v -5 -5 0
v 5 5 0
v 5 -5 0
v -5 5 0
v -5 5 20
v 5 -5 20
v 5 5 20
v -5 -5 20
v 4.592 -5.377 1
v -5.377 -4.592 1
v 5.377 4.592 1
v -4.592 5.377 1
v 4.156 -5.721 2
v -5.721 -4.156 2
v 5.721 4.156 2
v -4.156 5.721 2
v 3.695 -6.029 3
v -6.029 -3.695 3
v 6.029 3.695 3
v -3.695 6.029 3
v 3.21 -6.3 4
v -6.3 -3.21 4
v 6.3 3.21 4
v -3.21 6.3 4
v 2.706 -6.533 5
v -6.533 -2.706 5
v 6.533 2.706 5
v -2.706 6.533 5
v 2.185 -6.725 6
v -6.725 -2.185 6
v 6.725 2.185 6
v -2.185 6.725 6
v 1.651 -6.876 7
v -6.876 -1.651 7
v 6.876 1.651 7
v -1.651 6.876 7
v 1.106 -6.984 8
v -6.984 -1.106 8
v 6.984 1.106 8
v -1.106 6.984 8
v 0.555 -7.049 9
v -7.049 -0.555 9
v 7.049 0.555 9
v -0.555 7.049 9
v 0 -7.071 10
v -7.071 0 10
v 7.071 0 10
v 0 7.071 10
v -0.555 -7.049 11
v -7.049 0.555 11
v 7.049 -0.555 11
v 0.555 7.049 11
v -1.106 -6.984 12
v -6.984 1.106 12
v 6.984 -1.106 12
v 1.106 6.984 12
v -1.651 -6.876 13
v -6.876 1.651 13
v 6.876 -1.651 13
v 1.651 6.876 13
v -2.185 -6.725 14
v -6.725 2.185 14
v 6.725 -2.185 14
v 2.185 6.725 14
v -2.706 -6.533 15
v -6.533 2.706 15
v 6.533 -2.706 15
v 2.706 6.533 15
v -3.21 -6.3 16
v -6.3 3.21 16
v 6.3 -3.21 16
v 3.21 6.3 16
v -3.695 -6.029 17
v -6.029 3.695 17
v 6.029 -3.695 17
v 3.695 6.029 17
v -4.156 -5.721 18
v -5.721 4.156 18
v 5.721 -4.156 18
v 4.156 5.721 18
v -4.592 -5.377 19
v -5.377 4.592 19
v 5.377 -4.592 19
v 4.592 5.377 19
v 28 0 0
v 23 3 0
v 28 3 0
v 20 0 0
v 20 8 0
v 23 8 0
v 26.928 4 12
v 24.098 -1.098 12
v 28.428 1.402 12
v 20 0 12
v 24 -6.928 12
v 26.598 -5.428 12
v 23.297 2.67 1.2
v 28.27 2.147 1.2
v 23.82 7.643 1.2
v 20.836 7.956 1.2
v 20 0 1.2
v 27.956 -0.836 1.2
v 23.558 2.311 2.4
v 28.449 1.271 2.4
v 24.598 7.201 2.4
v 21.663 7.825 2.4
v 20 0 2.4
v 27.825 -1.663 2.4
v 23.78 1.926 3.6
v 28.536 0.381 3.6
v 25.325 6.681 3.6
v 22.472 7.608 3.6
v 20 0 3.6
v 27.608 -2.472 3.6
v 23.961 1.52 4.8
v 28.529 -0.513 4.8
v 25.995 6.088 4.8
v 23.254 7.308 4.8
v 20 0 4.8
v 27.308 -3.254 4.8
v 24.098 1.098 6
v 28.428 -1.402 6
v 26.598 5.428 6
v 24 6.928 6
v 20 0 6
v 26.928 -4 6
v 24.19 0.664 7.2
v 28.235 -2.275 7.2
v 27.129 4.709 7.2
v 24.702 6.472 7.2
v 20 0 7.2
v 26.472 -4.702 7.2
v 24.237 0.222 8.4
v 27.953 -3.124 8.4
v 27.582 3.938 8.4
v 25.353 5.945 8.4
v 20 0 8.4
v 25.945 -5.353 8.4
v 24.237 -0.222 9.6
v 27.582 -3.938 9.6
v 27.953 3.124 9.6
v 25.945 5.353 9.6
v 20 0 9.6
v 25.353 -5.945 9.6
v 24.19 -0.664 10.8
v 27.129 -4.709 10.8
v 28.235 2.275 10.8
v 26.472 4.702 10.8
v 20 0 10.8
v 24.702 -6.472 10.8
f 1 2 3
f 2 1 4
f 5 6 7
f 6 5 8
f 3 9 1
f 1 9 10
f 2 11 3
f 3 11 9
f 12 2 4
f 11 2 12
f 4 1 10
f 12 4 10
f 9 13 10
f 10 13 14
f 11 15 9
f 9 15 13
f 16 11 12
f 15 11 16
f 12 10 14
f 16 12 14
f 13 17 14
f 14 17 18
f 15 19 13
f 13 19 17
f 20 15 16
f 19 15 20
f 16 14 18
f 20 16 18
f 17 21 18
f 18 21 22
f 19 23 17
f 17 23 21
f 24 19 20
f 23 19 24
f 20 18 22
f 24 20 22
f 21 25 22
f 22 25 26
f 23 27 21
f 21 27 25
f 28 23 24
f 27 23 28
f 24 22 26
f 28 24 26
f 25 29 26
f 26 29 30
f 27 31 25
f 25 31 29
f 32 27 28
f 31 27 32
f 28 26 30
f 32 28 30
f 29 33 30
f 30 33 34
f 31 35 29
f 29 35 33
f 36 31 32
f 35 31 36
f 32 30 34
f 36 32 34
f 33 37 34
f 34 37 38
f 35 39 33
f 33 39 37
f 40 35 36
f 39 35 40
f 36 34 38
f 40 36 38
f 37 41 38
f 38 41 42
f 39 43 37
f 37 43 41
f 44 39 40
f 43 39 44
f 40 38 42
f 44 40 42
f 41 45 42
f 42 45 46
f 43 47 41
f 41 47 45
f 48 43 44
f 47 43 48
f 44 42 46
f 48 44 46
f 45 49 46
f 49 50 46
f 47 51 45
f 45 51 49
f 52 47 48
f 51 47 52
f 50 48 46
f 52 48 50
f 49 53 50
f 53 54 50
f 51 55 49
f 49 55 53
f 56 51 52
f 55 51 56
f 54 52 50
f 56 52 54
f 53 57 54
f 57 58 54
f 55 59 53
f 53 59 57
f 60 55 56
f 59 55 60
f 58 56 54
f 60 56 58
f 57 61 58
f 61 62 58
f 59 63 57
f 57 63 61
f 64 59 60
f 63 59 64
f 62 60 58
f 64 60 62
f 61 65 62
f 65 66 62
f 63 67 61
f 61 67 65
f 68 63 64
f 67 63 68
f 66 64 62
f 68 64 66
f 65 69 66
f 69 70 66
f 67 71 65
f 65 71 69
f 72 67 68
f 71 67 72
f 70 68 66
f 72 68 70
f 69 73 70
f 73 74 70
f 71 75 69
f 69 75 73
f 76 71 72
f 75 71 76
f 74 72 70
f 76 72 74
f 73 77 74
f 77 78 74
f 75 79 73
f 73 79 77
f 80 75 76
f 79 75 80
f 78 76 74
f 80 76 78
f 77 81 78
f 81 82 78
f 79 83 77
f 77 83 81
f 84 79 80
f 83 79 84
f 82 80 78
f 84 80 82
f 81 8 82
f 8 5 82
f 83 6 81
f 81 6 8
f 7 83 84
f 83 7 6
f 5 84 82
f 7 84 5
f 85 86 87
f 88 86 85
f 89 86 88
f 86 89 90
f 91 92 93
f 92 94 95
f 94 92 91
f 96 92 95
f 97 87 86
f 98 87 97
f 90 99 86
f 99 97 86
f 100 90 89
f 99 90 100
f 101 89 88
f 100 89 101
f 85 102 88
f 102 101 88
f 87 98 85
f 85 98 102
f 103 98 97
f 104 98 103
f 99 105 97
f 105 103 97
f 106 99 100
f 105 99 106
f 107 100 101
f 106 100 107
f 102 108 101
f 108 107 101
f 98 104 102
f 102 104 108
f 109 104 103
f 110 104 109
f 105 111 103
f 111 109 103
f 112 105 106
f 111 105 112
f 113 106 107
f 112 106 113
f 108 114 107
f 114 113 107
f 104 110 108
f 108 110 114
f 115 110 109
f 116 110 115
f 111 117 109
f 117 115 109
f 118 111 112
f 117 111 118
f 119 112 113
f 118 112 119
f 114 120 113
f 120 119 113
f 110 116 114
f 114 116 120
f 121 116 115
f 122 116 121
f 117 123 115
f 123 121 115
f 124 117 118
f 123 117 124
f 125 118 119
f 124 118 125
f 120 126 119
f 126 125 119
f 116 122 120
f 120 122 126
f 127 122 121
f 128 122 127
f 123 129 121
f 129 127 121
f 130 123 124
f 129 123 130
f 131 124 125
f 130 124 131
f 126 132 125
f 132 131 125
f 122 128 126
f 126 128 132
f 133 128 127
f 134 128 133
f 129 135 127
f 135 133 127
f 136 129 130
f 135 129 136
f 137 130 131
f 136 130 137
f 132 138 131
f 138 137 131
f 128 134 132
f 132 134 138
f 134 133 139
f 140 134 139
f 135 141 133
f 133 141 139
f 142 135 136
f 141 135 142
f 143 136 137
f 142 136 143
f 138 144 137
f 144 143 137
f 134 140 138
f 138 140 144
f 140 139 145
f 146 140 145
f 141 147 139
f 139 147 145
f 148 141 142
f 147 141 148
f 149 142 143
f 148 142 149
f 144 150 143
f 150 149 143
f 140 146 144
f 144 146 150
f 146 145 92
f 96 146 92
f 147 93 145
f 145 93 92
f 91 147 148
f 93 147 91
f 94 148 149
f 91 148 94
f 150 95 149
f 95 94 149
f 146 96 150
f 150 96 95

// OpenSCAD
// linear_extrude(twist=) is built as OpenSCAD builds it: a polyhedron through the slice rings, two
// triangles per side quad — a twisted square and a twisted non-convex L. (A cap with a hole and a
// twist + scale are pinned in cad-engine's extrude tests: this openscad-wasm's CGAL refuses both.)
linear_extrude(height = 20, twist = 90, slices = 20) square(10, center = true);
translate([20, 0, 0]) linear_extrude(height = 12, twist = 60, slices = 10)
  polygon([[0, 0], [8, 0], [8, 3], [3, 3], [3, 8], [0, 8]]);
